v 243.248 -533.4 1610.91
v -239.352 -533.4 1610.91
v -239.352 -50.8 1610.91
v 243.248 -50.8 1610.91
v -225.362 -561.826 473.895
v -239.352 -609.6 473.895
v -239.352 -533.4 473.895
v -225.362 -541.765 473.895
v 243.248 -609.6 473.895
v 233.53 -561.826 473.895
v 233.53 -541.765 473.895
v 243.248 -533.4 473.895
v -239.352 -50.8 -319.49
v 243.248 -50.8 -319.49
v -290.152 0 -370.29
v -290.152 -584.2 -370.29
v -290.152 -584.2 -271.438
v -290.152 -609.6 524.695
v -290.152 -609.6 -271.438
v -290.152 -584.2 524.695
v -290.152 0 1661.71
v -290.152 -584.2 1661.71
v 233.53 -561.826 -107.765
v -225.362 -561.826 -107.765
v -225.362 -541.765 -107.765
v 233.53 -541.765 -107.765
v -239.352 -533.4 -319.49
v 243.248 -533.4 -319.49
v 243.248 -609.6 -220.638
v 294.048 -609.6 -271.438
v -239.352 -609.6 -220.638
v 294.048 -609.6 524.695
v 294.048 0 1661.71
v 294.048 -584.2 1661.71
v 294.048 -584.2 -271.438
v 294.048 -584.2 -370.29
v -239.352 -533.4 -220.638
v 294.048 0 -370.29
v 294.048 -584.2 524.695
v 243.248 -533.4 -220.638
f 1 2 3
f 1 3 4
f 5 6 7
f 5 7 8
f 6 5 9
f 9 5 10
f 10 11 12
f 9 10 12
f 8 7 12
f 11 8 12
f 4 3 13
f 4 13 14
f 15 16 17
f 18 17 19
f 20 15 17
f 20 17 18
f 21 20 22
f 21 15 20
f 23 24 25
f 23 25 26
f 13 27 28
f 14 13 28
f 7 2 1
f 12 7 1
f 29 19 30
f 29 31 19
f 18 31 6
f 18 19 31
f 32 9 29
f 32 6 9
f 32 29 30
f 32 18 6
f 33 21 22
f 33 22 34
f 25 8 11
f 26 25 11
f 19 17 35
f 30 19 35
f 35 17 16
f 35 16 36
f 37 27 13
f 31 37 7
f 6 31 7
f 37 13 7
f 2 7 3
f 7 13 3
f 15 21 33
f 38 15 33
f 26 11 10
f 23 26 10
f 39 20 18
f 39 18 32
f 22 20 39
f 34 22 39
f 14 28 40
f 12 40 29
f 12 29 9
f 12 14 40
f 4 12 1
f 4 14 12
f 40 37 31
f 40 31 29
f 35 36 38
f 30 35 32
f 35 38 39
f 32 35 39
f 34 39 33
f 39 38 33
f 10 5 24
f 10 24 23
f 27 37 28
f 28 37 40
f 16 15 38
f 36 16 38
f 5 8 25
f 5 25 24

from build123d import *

# Parameters (mm, degrees)
F0_W     = 584.2
F0_H     = 2032
F1_DEPTH = 584.2
F2_W     = 584.2
F2_H     = 796.1330711842
F3_DEPTH = 25.4
F4_T     = -50.8
F5_W     = 458.8919430971
F5_H     = 20.0611352921
F6_DEPTH = 581.66


with BuildPart() as f1:
    # F0 (on Front) → F1 (new body)
    with BuildSketch(Plane.XZ):
        with Locations((1.9479468465, 645.7104609217)):
            Rectangle(F0_W, F0_H)
    extrude(amount=F1_DEPTH)

    # F2 (on face) → F3 (join)
    with BuildSketch(Plane.XZ.offset(584.2)):
        with Locations((1.9479468465, 126.6288906336)):
            Rectangle(F2_W, F2_H)
    extrude(amount=F3_DEPTH)

    # F4
    f4_openings = [f1.faces().sort_by_distance(p)[0] for p in [
        (1.947947, -609.6, 126.628891),
    ]]
    offset(amount=F4_T, openings=f4_openings, kind=Kind.INTERSECTION)

    # F5 (on face) → F6 (join)
    with BuildSketch(Plane(origin=(0, 0, 473.8954262257), x_dir=(1, 0, 0), z_dir=(0, 0, -1))):
        with Locations((4.084430635, 551.7954230309)):
            Rectangle(F5_W, F5_H)
    extrude(amount=F6_DEPTH)


solid = f1.part
